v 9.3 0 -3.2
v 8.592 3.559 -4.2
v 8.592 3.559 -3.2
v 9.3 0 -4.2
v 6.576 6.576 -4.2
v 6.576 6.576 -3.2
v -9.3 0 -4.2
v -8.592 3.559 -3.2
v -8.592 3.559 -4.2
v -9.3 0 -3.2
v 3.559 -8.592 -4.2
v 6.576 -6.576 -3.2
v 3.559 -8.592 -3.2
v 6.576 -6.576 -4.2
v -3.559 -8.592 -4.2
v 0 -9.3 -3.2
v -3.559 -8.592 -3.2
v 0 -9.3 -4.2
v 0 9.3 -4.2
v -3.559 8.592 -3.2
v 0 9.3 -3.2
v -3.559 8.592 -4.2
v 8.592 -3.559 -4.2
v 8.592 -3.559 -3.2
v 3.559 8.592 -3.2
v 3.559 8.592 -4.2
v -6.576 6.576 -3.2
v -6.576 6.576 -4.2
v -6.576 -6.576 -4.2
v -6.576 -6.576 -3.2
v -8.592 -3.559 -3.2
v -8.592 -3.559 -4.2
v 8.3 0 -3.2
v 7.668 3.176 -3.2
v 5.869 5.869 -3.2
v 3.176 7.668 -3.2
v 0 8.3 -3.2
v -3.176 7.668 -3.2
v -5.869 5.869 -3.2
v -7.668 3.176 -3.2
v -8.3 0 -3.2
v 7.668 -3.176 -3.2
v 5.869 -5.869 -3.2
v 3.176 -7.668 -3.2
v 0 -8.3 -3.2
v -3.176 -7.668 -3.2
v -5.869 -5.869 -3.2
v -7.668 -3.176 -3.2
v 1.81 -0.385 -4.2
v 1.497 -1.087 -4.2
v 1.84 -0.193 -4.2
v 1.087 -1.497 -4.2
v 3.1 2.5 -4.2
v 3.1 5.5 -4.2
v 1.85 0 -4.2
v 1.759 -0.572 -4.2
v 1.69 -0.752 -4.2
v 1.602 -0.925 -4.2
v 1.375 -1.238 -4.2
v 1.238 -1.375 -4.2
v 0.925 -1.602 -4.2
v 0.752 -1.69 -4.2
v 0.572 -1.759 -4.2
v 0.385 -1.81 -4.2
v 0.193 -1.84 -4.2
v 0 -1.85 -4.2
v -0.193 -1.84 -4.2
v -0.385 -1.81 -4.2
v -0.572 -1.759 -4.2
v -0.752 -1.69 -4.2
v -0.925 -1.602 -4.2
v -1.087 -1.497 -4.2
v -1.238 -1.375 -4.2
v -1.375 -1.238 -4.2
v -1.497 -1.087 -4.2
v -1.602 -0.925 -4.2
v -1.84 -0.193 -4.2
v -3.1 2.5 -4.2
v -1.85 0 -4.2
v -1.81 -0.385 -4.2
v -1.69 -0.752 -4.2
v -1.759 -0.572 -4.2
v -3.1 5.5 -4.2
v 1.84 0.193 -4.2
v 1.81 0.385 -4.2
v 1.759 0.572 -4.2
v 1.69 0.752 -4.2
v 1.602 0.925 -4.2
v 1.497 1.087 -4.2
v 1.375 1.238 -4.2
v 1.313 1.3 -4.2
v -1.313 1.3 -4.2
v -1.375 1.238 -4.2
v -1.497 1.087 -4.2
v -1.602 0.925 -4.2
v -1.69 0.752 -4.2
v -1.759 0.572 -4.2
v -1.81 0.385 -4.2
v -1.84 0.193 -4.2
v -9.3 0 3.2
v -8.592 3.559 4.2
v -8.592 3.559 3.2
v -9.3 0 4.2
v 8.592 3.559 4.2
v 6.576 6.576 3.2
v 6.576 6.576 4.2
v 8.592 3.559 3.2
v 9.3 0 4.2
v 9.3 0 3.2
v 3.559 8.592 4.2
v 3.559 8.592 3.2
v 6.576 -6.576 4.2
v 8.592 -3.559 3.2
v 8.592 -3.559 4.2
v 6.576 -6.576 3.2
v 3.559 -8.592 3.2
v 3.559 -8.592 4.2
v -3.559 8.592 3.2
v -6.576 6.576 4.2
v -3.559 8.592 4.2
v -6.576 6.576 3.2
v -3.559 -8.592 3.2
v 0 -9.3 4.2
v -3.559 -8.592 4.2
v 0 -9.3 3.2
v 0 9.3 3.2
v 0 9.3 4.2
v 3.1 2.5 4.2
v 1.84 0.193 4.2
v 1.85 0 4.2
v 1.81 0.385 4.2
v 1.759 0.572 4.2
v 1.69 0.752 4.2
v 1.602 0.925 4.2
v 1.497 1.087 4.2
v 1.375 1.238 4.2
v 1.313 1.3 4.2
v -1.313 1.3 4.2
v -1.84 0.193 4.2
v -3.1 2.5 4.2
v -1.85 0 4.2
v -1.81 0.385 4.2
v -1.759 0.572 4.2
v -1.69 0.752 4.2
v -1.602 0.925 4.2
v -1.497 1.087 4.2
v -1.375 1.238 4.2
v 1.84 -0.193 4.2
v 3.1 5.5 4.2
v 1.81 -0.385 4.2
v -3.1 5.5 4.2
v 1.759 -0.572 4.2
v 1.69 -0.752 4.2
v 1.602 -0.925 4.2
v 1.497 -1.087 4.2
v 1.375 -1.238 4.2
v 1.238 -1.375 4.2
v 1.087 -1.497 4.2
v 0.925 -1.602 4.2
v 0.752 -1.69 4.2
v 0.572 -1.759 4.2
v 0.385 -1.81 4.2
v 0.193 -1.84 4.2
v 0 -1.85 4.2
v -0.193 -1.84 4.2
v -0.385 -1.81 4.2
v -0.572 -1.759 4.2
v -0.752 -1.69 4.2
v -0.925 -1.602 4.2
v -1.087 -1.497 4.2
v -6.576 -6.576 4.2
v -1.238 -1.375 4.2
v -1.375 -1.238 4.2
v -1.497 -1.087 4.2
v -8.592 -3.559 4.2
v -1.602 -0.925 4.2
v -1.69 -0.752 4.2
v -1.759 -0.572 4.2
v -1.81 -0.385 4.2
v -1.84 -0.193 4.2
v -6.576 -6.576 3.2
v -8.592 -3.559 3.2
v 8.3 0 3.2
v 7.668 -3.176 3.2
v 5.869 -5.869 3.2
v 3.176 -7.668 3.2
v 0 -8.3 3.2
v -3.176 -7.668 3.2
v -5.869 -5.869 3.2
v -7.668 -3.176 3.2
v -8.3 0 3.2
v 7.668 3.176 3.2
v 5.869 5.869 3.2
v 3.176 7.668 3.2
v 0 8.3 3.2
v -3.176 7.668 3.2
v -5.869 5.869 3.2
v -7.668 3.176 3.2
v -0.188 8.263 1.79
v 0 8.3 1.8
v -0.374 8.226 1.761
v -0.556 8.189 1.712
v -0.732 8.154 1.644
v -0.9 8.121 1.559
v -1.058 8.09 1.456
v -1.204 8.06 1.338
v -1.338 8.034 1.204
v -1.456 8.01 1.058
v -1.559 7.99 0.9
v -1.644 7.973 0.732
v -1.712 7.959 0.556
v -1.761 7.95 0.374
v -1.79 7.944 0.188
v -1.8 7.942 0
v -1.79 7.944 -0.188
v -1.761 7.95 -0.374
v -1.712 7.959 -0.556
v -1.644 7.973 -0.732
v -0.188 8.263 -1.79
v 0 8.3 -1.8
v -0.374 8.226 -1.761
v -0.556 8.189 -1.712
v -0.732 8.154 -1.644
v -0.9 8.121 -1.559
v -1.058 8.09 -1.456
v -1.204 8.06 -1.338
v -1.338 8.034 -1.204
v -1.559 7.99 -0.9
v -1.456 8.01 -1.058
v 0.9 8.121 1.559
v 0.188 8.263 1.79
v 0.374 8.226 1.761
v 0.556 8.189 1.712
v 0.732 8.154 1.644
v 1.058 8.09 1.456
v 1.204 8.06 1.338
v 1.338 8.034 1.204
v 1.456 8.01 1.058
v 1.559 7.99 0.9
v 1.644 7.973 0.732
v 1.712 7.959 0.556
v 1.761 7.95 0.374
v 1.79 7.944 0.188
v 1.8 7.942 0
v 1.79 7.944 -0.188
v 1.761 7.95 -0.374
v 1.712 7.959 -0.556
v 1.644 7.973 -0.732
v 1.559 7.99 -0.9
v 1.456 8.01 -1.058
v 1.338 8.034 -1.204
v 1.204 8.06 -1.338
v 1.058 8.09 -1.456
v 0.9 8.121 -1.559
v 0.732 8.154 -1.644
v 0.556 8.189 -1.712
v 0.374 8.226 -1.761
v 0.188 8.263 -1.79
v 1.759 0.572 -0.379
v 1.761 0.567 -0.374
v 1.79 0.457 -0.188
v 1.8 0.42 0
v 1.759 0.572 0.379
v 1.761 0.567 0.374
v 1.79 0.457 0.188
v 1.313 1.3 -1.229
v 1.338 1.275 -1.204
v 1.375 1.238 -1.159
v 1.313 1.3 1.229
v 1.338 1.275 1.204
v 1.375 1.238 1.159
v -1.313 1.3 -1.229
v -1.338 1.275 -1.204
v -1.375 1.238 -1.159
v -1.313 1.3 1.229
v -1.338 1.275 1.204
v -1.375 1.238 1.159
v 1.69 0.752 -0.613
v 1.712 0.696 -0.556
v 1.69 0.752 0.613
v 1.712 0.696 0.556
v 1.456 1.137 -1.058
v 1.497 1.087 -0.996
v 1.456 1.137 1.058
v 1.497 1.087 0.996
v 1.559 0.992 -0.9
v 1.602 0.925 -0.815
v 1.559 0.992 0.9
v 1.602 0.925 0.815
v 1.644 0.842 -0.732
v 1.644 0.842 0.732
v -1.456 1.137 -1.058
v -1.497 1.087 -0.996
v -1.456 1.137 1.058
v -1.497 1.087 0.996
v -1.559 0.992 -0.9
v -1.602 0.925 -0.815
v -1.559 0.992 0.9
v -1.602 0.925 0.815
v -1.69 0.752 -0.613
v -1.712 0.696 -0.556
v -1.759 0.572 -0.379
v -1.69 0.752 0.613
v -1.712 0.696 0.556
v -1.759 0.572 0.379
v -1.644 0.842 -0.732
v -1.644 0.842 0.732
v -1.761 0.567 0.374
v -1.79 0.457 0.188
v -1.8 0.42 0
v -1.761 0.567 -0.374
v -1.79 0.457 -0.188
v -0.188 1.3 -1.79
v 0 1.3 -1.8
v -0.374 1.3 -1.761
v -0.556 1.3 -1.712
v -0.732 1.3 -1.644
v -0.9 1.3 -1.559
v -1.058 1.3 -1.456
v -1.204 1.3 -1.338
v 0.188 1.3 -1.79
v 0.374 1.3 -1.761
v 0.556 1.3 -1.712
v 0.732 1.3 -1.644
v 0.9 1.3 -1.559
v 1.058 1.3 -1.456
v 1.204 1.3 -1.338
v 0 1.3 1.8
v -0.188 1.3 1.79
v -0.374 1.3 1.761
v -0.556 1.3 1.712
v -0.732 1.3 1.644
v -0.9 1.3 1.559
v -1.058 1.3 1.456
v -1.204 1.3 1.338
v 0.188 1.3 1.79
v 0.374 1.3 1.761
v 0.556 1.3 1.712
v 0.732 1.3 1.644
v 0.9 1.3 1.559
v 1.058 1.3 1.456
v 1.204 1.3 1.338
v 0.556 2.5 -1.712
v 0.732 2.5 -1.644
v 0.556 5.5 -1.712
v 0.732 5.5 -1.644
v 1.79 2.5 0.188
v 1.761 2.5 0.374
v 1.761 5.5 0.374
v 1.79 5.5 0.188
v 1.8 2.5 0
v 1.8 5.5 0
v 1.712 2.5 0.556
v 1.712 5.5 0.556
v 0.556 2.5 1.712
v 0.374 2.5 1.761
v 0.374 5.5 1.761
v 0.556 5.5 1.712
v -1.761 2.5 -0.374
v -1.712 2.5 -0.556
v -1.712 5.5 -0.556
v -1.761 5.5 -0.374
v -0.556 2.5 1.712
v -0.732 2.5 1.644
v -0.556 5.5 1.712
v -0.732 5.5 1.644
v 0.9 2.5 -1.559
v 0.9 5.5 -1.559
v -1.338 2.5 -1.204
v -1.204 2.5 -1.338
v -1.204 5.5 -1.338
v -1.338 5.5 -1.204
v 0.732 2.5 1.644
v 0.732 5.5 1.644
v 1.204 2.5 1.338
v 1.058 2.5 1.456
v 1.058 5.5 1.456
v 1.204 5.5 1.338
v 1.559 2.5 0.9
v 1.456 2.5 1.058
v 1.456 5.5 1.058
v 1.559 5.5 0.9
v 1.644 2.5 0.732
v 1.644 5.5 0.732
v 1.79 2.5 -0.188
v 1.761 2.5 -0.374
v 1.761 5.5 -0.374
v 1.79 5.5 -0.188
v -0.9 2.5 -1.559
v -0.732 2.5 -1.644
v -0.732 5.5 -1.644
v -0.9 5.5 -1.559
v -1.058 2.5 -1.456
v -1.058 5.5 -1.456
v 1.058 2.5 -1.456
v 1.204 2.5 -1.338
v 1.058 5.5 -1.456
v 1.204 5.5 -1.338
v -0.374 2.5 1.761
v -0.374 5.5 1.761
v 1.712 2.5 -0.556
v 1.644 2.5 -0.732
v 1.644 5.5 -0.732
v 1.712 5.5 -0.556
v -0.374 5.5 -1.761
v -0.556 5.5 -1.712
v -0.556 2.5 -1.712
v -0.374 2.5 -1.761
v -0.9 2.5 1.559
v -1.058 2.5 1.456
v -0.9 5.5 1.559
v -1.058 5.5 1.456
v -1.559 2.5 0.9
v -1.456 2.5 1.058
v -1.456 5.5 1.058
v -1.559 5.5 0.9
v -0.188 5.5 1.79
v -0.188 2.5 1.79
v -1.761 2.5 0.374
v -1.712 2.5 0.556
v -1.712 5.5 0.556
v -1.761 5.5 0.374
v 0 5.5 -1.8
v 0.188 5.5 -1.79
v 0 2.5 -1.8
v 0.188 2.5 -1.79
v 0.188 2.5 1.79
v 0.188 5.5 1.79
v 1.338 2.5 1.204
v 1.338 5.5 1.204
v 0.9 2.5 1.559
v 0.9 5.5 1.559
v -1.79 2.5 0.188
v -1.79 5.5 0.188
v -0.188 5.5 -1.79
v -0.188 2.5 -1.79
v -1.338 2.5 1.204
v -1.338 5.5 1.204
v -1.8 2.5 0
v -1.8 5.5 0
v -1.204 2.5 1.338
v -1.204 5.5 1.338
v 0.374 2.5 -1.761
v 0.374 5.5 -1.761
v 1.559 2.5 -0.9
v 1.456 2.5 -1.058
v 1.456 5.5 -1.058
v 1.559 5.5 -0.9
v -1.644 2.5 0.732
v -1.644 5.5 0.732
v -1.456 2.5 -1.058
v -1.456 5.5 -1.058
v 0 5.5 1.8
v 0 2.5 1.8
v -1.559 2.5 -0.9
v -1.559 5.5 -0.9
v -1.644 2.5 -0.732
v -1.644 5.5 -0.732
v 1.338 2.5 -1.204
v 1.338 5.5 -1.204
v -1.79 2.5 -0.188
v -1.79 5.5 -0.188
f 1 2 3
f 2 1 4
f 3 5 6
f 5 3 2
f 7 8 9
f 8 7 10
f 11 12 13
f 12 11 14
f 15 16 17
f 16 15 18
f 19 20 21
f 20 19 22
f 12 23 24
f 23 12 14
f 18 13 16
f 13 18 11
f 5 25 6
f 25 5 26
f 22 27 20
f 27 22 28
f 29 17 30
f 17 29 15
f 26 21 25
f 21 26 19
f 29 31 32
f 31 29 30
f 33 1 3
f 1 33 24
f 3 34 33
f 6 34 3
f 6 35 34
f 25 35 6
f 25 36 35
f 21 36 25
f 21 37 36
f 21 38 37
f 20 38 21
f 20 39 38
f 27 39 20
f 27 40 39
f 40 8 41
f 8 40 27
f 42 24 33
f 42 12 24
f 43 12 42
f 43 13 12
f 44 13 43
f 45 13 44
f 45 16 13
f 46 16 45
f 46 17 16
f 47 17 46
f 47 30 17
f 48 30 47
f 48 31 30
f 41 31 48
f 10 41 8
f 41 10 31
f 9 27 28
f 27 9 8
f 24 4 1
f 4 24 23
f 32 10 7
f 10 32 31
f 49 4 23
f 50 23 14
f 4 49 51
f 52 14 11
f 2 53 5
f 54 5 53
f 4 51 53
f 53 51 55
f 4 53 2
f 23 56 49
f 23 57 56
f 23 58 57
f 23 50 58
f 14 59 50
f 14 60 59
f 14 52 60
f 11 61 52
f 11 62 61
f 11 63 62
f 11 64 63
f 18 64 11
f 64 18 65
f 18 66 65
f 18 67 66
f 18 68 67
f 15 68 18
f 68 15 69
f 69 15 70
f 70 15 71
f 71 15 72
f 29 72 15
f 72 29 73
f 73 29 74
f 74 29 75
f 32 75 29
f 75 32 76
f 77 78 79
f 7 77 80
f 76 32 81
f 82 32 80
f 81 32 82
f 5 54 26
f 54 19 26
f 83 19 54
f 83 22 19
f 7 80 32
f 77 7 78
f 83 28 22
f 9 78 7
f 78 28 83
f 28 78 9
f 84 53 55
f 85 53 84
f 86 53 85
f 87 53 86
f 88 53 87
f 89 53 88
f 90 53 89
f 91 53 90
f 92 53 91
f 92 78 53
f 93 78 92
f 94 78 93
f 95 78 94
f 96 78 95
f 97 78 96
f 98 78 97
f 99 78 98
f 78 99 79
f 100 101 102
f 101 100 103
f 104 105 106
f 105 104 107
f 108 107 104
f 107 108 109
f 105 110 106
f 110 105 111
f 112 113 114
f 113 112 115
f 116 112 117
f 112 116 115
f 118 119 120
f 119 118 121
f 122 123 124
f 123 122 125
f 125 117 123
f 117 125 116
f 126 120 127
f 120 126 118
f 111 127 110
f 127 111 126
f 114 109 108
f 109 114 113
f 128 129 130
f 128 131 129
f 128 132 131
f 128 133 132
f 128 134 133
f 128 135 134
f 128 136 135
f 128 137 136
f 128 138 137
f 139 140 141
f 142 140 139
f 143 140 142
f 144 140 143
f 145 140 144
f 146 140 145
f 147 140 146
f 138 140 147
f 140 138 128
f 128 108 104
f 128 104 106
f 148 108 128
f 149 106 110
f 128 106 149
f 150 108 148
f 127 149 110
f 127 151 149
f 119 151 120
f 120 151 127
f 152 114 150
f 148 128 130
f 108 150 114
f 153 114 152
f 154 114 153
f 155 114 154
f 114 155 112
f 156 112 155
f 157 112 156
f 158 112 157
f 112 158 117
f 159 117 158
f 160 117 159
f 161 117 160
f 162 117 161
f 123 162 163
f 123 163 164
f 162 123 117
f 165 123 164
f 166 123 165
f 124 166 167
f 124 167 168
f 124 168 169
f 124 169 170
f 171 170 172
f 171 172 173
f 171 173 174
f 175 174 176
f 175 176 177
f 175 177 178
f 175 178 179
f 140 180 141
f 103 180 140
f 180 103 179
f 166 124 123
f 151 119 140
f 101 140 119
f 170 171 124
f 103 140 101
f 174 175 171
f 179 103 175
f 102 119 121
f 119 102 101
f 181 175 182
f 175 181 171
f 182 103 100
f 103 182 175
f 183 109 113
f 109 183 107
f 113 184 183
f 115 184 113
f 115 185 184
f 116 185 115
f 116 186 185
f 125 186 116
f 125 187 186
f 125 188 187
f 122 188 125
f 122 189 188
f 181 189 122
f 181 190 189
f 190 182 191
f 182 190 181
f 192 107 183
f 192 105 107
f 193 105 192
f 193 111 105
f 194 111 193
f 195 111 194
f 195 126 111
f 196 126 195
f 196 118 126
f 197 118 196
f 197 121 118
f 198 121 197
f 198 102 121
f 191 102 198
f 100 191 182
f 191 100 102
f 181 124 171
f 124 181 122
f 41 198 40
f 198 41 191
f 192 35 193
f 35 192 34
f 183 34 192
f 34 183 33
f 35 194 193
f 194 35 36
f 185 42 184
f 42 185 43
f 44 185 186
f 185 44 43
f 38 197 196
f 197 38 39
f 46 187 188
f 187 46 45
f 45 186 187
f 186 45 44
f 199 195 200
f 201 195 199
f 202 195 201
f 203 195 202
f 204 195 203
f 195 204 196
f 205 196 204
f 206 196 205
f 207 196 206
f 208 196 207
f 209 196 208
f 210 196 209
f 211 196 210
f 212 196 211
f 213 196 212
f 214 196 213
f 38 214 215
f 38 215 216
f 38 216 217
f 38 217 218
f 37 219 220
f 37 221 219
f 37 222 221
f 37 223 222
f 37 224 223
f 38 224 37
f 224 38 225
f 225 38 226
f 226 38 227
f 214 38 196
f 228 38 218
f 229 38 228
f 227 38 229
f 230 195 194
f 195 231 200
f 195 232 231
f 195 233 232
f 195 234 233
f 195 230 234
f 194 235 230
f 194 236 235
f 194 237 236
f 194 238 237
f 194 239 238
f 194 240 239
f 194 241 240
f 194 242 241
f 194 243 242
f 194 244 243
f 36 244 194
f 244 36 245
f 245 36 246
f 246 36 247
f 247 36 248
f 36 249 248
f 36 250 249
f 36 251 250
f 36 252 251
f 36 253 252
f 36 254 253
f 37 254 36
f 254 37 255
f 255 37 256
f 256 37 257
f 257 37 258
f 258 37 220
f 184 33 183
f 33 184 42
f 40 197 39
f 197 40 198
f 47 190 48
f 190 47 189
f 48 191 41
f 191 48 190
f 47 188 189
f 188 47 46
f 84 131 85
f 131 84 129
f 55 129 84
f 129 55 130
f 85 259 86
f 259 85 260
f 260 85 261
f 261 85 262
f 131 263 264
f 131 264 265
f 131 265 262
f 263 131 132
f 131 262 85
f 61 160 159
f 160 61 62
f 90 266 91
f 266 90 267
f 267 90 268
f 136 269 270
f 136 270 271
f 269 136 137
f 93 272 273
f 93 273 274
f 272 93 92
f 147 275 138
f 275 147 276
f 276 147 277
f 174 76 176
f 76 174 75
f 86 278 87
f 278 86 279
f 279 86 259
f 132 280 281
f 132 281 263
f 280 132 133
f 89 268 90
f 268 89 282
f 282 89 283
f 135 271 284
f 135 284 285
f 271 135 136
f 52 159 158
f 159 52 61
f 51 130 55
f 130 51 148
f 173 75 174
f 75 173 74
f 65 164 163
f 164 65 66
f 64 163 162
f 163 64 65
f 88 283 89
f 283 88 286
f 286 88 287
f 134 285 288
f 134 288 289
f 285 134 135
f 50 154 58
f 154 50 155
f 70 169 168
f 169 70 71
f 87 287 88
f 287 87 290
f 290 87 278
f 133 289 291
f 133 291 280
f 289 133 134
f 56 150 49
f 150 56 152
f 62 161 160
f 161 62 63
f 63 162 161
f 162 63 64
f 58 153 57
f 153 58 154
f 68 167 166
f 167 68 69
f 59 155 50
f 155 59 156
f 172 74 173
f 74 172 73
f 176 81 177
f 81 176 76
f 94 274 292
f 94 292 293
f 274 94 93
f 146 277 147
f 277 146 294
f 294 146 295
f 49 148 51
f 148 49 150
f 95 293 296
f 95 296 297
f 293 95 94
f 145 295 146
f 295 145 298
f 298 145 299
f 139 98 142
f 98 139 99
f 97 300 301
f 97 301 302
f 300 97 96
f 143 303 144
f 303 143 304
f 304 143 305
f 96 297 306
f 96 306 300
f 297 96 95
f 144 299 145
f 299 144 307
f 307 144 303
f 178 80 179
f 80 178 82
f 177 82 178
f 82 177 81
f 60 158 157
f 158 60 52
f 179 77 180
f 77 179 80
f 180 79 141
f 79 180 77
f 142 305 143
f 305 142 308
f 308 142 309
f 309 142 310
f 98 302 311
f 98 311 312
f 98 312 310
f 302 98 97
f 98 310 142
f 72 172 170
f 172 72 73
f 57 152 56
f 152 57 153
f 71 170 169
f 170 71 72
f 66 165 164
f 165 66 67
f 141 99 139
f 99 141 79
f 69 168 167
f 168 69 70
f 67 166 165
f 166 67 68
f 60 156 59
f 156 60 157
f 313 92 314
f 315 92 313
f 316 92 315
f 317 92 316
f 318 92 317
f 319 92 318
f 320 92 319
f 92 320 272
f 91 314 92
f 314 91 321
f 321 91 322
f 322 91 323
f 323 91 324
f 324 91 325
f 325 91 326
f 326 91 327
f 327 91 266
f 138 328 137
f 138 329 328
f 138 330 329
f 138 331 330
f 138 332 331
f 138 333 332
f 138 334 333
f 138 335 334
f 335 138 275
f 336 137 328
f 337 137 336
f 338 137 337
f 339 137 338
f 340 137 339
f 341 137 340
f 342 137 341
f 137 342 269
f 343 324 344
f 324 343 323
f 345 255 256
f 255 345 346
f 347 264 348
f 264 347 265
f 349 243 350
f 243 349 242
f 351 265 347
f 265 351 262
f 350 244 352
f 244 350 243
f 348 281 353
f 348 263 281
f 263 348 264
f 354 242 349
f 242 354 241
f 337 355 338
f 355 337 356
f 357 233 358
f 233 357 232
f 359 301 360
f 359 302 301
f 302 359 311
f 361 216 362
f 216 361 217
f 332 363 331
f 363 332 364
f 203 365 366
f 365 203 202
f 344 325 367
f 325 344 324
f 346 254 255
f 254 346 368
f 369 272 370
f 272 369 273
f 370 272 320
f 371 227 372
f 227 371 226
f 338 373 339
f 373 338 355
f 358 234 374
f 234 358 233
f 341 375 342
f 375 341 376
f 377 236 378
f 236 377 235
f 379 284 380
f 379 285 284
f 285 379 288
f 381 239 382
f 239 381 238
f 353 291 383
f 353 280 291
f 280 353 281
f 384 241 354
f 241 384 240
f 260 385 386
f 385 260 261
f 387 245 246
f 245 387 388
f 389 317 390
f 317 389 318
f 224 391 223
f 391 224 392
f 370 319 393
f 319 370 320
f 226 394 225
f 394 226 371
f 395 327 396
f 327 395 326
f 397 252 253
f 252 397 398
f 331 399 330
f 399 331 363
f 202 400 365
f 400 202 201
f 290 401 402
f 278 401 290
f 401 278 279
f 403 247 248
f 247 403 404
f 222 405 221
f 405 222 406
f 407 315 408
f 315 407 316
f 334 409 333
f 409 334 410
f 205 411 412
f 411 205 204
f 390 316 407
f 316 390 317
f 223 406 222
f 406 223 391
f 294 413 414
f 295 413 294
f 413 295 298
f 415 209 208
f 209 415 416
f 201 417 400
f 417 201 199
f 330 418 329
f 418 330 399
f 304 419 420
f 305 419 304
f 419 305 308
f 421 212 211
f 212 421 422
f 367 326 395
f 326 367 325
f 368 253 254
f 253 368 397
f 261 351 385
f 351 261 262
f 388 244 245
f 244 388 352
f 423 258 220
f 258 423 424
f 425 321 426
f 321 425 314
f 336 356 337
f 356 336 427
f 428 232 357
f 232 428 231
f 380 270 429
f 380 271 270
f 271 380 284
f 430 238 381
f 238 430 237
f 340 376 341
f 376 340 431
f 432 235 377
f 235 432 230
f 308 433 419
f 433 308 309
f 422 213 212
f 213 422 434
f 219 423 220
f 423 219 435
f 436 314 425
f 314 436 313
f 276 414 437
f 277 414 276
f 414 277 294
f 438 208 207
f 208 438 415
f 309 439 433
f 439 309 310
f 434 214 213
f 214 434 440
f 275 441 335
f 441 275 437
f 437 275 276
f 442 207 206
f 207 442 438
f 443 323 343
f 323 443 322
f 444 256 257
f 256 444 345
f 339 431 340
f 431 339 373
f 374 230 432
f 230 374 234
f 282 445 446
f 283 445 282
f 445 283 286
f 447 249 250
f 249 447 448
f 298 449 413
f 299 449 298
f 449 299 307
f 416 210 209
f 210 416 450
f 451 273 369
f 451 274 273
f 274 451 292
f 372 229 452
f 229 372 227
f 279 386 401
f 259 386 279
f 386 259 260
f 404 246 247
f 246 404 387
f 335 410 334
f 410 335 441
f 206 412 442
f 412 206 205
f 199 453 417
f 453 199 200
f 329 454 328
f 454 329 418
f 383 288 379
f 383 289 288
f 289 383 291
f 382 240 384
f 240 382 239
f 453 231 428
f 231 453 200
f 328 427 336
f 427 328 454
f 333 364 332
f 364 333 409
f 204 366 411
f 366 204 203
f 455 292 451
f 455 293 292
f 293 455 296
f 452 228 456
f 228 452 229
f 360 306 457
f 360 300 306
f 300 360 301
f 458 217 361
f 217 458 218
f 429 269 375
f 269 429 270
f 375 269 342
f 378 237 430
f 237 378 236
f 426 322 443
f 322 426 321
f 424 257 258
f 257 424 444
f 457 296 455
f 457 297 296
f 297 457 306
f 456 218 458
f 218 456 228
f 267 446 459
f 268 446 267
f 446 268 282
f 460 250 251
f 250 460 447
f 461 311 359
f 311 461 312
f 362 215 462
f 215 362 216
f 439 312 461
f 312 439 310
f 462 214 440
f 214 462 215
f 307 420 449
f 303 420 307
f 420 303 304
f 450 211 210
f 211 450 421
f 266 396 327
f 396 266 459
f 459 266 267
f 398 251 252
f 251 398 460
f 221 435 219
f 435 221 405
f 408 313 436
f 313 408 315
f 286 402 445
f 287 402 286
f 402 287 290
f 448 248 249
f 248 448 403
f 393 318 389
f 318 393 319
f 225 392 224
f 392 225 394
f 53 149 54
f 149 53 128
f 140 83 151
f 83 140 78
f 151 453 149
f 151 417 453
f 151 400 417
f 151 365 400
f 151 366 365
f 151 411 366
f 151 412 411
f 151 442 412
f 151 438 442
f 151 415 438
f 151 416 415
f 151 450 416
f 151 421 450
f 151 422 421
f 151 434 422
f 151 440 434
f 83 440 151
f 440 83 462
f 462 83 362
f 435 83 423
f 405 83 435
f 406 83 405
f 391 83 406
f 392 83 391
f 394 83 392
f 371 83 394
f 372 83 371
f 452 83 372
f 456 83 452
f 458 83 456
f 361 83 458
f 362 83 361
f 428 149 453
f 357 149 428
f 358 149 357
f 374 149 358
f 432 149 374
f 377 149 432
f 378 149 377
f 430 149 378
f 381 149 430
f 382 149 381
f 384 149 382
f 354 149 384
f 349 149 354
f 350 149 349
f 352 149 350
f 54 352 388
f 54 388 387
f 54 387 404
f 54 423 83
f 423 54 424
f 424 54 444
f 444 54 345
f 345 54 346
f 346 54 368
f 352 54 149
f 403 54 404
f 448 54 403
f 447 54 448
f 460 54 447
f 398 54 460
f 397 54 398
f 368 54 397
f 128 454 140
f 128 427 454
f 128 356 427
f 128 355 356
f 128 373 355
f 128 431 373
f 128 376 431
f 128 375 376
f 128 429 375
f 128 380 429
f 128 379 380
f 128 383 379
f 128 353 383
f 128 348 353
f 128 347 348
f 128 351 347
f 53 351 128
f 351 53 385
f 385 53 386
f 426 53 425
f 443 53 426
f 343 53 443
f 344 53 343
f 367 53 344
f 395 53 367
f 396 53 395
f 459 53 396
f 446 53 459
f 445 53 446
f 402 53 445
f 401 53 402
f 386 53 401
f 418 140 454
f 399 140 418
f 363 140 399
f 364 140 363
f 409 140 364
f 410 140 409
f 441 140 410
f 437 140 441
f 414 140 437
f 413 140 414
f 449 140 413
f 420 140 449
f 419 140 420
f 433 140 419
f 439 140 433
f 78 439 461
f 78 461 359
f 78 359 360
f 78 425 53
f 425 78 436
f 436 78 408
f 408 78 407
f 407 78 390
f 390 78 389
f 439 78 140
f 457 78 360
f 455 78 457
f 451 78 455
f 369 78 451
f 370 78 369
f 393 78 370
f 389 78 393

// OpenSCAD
//LippedReadWheel.scad (c) by Embecosm Ltd.
//
//LippedReadWheel.scad is licensed under a
//Creative Commons Attribution-ShareAlike 4.0 International License.
//
//You should have received a copy of the license along with this
//work. If not, see <http://creativecommons.org/licenses/by-sa/4.0/>.

difference(){
    union(){
        translate([0,0,-3.7])
            cylinder(r=9.3, h=1, $fn=16, center=true);
        translate([0,0,3.7])
            cylinder(r=9.3, h=1, $fn=16, center=true);
        cylinder(r=8.3, h=8.4, $fn=16, center=true);
    };
    difference(){
        cylinder(r=1.85, h=14, $fn=60, center=true);
        translate([0,2.8,0])
            cube([3,3,16], center=true);
    };
    translate([0,5,0])
        rotate([90,0,0])
            cylinder(r=1.8, h=10, $fn=60, center=true);
    translate([0,4,0])
        cube([6.2,3,14], center=true);
};
